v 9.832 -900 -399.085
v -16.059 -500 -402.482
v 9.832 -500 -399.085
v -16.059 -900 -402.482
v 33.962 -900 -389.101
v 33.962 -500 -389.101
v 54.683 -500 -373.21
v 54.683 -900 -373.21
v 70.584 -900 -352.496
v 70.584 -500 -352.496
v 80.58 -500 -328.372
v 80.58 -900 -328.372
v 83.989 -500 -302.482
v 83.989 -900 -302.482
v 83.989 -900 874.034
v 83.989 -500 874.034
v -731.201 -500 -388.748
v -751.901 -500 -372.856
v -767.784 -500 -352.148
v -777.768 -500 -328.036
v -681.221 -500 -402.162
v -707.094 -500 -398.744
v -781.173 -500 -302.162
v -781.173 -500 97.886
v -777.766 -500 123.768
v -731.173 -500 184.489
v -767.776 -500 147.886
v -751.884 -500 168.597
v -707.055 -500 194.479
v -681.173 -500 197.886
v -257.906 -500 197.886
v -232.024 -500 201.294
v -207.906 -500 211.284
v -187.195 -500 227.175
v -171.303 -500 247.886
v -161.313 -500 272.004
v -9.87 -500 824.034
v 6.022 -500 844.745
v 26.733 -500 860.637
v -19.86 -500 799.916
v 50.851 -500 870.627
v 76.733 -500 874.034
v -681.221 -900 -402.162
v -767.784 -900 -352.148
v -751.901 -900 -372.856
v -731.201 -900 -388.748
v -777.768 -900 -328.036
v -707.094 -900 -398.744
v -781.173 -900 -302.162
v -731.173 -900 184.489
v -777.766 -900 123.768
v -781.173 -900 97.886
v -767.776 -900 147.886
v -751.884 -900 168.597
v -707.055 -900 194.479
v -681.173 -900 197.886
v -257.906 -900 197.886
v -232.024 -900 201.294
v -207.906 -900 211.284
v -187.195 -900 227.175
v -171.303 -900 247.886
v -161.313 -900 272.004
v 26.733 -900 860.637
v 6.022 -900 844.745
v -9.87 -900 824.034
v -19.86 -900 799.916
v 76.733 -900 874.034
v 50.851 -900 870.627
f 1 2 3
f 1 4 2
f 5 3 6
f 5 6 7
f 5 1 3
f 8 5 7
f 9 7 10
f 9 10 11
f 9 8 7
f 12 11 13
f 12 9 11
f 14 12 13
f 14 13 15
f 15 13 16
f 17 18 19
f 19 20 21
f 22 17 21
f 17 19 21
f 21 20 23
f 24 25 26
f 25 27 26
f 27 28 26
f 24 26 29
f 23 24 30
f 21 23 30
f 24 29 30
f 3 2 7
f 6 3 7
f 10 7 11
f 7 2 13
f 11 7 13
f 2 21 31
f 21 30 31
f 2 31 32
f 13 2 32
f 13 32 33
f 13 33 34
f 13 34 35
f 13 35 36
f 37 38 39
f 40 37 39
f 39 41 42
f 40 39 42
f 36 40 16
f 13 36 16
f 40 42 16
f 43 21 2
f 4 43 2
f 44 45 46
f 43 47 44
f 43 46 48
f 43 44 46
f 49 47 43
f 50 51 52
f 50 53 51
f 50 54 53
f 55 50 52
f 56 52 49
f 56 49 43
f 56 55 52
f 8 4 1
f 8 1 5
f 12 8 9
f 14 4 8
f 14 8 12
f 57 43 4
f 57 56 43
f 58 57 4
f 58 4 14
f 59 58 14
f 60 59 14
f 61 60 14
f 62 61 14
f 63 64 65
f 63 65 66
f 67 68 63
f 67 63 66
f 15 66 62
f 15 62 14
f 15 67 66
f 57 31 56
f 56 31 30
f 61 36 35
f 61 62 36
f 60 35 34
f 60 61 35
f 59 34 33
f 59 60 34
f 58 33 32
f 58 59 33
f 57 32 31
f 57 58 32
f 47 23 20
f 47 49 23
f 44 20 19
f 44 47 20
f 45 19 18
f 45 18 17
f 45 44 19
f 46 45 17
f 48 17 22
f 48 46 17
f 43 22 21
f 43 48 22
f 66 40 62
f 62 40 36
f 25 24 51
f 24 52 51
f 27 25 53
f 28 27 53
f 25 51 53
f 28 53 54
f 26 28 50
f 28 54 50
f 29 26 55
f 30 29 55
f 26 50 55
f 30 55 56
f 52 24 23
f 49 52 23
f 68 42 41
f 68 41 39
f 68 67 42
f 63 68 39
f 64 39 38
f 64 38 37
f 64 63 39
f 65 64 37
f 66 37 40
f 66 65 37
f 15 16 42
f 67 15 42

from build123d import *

# Parameters (mm, degrees)
F2_DEPTH = 400
F3_R     = 100


# Not quite as in the source:
# - a feature of the source that left no trace in its solid (it failed there, or was rolled back) is left out
# - the program builds the solid bodies; features that only make, move or delete a surface that nothing else refers to are left out


with BuildPart() as f2:
    # F1 (on offset) → F2 (new body)
    with BuildSketch(Plane.XZ.offset(500)):
        Polygon((-781.1733315718, 197.8861267962), (-781.1733315718, -402.1138732038), (83.9892935576, -402.5302380195), (83.9892935576, 874.0342051986), (0, 874.0342051986), (-181.1733315718, 197.8861267962), align=None)
    extrude(amount=F2_DEPTH)

    # F3
    f3_edges = [f2.edges().sort_by_distance(p)[0] for p in [
        (-781.173332, -700, 197.886127),
        (0, -700, 874.034205),
        (-181.173332, -700, 197.886127),
        (-781.173332, -700, -402.113873),
        (83.989294, -700, -402.530238),
    ]]
    fillet(f3_edges, radius=F3_R)


solid = f2.part
